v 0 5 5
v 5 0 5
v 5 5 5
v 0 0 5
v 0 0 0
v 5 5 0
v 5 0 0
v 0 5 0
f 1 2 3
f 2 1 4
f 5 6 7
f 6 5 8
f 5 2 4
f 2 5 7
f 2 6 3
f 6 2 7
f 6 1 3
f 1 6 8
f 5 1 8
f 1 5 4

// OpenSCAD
/*
 * OpenSCAD Workshop Examples
 * Copyright (c) 2013-2016 Anar Software LLC. < http://anars.com >
 *
 * This program is free software: you can redistribute it and/or modify it under
 * the terms of the GNU General Public License as published by the Free Software
 * Foundation, either version 3 of the License, or (at your option) any later
 * version.
 *
 * This program is distributed in the hope that it will be useful, but WITHOUT
 * ANY WARRANTY; without even the implied warranty of MERCHANTABILITY or FITNESS
 * FOR A PARTICULAR PURPOSE. See the GNU General Public License for more details.
 *
 * You should have received a copy of the GNU General Public License along with
 * this program. If not, see < http://www.gnu.org/licenses/ >
 *
 */
/*

Creates a cube with sides of that 1 unit length in the first octant. The argument names are optional if the arguments are given in the same order as specified in the parameters.

Parameters :

	cube(x);

*/

cube(5);
